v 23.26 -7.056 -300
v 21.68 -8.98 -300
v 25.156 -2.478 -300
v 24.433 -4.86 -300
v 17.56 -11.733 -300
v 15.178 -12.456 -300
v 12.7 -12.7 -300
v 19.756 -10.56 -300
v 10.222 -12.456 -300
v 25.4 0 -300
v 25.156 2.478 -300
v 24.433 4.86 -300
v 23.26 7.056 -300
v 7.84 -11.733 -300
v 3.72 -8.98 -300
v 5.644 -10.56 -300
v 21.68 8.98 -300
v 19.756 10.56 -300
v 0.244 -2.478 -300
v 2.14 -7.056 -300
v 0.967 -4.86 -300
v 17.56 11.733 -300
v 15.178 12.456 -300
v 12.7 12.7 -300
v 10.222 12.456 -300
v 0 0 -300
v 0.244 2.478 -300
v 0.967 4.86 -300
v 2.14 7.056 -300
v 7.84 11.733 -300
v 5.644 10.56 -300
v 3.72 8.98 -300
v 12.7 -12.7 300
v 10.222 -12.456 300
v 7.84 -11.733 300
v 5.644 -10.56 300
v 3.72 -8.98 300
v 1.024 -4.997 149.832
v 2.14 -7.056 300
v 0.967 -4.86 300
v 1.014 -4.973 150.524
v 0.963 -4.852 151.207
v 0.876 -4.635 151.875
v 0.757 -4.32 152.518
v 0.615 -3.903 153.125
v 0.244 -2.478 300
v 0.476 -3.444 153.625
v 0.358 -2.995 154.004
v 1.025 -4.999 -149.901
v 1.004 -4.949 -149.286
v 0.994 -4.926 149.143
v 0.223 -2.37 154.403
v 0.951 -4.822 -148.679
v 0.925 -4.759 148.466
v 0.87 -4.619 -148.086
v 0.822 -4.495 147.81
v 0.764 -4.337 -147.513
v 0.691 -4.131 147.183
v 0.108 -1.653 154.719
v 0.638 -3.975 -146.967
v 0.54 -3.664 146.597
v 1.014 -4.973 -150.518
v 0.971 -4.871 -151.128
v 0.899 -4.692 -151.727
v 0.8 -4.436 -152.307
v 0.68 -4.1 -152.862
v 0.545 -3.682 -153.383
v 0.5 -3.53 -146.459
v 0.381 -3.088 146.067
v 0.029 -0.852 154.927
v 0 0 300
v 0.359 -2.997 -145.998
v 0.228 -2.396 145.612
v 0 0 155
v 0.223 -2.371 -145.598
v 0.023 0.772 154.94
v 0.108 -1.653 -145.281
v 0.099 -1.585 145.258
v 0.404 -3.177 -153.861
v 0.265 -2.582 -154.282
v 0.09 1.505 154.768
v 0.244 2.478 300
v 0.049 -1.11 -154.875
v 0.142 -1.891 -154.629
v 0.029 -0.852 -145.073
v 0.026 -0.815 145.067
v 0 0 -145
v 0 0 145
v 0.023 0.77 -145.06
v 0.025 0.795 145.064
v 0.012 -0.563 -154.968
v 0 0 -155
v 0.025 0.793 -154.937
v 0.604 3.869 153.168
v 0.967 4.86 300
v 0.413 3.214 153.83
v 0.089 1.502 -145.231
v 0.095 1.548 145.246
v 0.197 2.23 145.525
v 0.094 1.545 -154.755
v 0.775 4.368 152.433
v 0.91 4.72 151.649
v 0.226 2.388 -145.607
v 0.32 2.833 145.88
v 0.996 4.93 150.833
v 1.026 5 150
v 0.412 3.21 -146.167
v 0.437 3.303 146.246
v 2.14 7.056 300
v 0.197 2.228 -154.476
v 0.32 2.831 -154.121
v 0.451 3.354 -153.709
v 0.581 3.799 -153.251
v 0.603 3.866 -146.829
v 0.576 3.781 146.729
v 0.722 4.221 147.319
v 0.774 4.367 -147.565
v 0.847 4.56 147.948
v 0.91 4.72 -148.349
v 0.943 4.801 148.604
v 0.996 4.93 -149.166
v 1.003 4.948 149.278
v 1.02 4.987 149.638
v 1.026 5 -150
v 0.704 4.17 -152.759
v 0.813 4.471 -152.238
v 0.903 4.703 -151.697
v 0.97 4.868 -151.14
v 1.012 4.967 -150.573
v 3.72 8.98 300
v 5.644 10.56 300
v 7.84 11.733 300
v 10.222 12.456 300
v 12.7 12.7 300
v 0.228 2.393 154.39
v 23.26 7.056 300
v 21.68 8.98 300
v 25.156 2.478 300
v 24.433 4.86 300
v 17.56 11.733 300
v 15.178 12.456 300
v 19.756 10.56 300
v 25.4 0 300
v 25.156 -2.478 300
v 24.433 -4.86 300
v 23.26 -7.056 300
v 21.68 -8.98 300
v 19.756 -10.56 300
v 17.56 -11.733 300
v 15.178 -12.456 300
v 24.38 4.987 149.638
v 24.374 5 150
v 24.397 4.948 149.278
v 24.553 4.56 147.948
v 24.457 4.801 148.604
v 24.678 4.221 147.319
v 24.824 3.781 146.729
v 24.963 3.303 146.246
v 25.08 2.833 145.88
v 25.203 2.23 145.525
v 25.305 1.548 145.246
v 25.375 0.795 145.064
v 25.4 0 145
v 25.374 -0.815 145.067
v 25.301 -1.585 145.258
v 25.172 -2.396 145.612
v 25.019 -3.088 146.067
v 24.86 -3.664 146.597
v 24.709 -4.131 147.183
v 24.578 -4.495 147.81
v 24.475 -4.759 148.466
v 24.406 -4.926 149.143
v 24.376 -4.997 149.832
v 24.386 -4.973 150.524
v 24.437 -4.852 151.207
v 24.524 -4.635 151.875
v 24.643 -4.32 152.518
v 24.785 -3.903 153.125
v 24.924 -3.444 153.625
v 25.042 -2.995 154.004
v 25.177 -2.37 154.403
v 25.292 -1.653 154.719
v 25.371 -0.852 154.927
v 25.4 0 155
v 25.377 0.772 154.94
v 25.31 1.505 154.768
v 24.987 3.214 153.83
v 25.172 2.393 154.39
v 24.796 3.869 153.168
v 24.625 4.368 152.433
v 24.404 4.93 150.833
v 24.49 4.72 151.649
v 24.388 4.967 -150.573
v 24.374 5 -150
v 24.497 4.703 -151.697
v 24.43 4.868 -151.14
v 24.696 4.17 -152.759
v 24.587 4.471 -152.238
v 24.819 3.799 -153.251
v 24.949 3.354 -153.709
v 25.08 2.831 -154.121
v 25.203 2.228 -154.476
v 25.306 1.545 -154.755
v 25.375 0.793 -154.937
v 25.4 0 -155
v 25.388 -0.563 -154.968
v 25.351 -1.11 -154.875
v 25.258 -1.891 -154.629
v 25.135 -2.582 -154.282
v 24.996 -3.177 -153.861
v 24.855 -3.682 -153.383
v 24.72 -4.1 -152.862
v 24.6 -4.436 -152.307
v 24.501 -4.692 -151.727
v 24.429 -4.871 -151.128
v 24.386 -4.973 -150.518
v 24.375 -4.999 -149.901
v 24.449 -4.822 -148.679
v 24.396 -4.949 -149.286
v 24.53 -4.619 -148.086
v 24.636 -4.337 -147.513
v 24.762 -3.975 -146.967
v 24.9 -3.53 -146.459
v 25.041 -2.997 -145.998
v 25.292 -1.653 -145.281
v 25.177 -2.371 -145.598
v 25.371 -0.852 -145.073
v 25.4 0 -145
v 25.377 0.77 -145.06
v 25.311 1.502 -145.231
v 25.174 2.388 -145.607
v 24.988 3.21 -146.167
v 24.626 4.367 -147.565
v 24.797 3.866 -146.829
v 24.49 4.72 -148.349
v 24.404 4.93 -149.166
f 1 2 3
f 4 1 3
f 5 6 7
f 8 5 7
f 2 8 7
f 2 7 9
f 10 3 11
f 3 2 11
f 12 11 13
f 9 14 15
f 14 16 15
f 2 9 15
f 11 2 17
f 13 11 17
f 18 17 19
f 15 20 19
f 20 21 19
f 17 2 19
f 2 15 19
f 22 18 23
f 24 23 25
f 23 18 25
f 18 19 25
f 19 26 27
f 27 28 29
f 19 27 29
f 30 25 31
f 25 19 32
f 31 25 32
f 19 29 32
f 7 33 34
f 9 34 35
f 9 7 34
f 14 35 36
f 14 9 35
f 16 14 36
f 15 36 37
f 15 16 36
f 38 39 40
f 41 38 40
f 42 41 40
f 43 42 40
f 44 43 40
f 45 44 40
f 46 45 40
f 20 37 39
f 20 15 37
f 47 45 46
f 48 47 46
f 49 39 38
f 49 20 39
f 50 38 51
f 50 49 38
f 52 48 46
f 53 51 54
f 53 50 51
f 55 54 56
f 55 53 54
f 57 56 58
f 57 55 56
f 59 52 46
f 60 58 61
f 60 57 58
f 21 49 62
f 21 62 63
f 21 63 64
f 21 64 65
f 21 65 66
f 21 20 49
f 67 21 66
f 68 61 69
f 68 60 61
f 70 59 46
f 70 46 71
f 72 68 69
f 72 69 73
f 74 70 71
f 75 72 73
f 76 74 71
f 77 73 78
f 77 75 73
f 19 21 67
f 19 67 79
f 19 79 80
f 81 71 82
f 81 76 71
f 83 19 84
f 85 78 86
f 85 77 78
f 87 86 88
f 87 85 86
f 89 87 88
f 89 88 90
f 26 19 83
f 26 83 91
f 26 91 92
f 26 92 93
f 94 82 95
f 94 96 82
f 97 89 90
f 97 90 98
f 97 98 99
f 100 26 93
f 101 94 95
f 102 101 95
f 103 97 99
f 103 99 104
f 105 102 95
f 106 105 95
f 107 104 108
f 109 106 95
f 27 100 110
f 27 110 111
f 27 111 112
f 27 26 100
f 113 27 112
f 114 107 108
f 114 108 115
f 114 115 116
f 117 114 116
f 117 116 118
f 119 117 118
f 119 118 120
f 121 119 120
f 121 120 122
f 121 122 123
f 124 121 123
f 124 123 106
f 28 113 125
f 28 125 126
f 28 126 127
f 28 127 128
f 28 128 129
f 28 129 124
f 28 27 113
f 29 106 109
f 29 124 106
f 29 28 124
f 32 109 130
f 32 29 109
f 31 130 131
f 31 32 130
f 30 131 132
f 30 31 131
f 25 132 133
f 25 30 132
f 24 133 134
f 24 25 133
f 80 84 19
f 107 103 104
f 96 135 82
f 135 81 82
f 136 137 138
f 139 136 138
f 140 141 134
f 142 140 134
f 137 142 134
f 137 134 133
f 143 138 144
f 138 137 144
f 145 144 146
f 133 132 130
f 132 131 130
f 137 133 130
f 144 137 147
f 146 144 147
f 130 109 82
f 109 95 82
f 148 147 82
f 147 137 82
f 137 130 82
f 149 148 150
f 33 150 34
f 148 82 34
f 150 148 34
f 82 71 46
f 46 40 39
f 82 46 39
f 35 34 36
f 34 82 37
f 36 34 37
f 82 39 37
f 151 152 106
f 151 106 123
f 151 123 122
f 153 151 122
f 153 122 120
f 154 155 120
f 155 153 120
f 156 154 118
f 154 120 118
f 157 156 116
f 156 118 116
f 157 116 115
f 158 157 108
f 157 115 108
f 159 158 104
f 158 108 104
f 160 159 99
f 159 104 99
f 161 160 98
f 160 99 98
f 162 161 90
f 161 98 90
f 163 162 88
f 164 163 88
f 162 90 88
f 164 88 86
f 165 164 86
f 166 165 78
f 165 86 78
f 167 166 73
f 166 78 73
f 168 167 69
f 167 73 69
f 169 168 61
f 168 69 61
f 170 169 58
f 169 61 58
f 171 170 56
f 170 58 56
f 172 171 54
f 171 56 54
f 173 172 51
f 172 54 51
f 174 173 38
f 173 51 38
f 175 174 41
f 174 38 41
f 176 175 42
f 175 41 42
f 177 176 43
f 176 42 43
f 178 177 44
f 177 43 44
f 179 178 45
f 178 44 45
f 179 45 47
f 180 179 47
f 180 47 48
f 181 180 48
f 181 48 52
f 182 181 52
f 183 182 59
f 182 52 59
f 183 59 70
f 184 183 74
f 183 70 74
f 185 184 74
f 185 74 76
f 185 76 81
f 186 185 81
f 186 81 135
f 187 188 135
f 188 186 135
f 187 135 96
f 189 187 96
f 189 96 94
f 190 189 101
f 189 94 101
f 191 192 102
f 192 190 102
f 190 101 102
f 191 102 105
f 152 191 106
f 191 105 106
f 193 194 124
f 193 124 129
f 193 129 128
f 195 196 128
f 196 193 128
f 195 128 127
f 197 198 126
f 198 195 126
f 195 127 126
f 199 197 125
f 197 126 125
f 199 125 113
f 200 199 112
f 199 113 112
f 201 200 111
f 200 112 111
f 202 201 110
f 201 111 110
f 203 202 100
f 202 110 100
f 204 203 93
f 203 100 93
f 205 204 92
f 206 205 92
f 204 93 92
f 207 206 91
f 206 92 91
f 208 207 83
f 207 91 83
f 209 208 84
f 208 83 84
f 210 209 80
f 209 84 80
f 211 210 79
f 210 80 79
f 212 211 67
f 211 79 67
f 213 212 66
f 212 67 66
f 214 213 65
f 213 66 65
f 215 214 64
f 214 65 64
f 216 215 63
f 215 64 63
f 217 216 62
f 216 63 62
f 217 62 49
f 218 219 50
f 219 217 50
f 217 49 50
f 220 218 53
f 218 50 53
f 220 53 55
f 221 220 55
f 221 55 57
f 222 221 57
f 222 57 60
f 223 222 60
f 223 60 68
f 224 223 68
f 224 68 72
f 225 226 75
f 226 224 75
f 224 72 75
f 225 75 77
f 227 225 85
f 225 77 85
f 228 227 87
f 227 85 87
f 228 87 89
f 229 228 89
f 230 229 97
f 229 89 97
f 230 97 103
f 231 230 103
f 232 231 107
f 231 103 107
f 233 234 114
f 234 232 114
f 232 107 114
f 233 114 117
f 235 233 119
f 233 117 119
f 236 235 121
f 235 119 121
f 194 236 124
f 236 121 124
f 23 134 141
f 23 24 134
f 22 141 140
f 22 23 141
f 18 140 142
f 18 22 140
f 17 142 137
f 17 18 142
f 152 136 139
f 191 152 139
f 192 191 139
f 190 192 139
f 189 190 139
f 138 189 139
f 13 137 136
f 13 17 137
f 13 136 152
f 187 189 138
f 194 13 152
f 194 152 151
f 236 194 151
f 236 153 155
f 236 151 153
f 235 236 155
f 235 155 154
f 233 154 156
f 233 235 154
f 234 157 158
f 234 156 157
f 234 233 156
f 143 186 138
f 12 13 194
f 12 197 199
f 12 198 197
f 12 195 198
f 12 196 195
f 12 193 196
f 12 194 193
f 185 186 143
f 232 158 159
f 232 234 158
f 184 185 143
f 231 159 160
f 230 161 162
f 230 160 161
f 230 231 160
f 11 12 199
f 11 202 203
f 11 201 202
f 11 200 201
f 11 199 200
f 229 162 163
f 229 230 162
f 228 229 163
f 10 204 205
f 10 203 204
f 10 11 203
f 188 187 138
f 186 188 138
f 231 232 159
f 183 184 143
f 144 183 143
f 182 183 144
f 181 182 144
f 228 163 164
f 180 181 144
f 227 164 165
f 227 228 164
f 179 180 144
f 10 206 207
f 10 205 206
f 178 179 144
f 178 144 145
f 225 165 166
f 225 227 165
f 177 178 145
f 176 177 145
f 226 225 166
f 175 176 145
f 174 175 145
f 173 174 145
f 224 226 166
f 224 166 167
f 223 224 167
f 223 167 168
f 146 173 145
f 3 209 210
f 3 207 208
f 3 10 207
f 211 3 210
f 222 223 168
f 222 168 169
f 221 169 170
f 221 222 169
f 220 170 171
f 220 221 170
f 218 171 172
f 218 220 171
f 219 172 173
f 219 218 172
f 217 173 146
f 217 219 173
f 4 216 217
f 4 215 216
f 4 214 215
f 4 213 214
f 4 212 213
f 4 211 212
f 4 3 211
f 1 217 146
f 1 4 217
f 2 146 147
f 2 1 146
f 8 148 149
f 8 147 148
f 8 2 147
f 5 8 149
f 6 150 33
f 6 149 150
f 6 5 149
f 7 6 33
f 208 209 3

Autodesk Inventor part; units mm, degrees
ref_plane "YZ Plane" through (0, 0, 0) normal (1, 0, 0) x (0, 1, 0)
ref_plane "XZ Plane" through (0, 0, 0) normal (0, 1, 0) x (-1, 0, 0)
ref_plane "XY Plane" through (0, 0, 0) normal (0, 0, 1) x (1, 0, 0)
sketch "Sketch1" plane through (0, 0, 0) normal (1, 0, 0) x (0, 1, 0)
  line L0 (12.7, 300) -> (-12.7, 300)
  line L1 (-12.7, 300) -> (-12.7, -300)
  line L2 (-12.7, -300) -> (12.7, -300)
  line L3 (12.7, -300) -> (12.7, 300)
  line L4 (12.7, 300) -> (-12.7, -300) construction
  line L5 (-12.7, 300) -> (12.7, -300) construction
  circle A0 centre (0, 150) radius 5
  circle A1 centre (0, -150) radius 5
  line L6 (0, 0) -> (0, -150)
  dimension "d0" = 25.4
  dimension "d1" = 600
  dimension "d3" = 10
  dimension "d8" = 150
extrude "Extrusion1" add sketch "Sketch1" along normal blind 25.4
fillet "Fillet1" radius 12.7 4 edges at (25.4, -12.7, 0) (0, -12.7, 0) (25.4, 12.7, 0) (0, 12.7, 0)
properties part number "Eixo_traseiro"
